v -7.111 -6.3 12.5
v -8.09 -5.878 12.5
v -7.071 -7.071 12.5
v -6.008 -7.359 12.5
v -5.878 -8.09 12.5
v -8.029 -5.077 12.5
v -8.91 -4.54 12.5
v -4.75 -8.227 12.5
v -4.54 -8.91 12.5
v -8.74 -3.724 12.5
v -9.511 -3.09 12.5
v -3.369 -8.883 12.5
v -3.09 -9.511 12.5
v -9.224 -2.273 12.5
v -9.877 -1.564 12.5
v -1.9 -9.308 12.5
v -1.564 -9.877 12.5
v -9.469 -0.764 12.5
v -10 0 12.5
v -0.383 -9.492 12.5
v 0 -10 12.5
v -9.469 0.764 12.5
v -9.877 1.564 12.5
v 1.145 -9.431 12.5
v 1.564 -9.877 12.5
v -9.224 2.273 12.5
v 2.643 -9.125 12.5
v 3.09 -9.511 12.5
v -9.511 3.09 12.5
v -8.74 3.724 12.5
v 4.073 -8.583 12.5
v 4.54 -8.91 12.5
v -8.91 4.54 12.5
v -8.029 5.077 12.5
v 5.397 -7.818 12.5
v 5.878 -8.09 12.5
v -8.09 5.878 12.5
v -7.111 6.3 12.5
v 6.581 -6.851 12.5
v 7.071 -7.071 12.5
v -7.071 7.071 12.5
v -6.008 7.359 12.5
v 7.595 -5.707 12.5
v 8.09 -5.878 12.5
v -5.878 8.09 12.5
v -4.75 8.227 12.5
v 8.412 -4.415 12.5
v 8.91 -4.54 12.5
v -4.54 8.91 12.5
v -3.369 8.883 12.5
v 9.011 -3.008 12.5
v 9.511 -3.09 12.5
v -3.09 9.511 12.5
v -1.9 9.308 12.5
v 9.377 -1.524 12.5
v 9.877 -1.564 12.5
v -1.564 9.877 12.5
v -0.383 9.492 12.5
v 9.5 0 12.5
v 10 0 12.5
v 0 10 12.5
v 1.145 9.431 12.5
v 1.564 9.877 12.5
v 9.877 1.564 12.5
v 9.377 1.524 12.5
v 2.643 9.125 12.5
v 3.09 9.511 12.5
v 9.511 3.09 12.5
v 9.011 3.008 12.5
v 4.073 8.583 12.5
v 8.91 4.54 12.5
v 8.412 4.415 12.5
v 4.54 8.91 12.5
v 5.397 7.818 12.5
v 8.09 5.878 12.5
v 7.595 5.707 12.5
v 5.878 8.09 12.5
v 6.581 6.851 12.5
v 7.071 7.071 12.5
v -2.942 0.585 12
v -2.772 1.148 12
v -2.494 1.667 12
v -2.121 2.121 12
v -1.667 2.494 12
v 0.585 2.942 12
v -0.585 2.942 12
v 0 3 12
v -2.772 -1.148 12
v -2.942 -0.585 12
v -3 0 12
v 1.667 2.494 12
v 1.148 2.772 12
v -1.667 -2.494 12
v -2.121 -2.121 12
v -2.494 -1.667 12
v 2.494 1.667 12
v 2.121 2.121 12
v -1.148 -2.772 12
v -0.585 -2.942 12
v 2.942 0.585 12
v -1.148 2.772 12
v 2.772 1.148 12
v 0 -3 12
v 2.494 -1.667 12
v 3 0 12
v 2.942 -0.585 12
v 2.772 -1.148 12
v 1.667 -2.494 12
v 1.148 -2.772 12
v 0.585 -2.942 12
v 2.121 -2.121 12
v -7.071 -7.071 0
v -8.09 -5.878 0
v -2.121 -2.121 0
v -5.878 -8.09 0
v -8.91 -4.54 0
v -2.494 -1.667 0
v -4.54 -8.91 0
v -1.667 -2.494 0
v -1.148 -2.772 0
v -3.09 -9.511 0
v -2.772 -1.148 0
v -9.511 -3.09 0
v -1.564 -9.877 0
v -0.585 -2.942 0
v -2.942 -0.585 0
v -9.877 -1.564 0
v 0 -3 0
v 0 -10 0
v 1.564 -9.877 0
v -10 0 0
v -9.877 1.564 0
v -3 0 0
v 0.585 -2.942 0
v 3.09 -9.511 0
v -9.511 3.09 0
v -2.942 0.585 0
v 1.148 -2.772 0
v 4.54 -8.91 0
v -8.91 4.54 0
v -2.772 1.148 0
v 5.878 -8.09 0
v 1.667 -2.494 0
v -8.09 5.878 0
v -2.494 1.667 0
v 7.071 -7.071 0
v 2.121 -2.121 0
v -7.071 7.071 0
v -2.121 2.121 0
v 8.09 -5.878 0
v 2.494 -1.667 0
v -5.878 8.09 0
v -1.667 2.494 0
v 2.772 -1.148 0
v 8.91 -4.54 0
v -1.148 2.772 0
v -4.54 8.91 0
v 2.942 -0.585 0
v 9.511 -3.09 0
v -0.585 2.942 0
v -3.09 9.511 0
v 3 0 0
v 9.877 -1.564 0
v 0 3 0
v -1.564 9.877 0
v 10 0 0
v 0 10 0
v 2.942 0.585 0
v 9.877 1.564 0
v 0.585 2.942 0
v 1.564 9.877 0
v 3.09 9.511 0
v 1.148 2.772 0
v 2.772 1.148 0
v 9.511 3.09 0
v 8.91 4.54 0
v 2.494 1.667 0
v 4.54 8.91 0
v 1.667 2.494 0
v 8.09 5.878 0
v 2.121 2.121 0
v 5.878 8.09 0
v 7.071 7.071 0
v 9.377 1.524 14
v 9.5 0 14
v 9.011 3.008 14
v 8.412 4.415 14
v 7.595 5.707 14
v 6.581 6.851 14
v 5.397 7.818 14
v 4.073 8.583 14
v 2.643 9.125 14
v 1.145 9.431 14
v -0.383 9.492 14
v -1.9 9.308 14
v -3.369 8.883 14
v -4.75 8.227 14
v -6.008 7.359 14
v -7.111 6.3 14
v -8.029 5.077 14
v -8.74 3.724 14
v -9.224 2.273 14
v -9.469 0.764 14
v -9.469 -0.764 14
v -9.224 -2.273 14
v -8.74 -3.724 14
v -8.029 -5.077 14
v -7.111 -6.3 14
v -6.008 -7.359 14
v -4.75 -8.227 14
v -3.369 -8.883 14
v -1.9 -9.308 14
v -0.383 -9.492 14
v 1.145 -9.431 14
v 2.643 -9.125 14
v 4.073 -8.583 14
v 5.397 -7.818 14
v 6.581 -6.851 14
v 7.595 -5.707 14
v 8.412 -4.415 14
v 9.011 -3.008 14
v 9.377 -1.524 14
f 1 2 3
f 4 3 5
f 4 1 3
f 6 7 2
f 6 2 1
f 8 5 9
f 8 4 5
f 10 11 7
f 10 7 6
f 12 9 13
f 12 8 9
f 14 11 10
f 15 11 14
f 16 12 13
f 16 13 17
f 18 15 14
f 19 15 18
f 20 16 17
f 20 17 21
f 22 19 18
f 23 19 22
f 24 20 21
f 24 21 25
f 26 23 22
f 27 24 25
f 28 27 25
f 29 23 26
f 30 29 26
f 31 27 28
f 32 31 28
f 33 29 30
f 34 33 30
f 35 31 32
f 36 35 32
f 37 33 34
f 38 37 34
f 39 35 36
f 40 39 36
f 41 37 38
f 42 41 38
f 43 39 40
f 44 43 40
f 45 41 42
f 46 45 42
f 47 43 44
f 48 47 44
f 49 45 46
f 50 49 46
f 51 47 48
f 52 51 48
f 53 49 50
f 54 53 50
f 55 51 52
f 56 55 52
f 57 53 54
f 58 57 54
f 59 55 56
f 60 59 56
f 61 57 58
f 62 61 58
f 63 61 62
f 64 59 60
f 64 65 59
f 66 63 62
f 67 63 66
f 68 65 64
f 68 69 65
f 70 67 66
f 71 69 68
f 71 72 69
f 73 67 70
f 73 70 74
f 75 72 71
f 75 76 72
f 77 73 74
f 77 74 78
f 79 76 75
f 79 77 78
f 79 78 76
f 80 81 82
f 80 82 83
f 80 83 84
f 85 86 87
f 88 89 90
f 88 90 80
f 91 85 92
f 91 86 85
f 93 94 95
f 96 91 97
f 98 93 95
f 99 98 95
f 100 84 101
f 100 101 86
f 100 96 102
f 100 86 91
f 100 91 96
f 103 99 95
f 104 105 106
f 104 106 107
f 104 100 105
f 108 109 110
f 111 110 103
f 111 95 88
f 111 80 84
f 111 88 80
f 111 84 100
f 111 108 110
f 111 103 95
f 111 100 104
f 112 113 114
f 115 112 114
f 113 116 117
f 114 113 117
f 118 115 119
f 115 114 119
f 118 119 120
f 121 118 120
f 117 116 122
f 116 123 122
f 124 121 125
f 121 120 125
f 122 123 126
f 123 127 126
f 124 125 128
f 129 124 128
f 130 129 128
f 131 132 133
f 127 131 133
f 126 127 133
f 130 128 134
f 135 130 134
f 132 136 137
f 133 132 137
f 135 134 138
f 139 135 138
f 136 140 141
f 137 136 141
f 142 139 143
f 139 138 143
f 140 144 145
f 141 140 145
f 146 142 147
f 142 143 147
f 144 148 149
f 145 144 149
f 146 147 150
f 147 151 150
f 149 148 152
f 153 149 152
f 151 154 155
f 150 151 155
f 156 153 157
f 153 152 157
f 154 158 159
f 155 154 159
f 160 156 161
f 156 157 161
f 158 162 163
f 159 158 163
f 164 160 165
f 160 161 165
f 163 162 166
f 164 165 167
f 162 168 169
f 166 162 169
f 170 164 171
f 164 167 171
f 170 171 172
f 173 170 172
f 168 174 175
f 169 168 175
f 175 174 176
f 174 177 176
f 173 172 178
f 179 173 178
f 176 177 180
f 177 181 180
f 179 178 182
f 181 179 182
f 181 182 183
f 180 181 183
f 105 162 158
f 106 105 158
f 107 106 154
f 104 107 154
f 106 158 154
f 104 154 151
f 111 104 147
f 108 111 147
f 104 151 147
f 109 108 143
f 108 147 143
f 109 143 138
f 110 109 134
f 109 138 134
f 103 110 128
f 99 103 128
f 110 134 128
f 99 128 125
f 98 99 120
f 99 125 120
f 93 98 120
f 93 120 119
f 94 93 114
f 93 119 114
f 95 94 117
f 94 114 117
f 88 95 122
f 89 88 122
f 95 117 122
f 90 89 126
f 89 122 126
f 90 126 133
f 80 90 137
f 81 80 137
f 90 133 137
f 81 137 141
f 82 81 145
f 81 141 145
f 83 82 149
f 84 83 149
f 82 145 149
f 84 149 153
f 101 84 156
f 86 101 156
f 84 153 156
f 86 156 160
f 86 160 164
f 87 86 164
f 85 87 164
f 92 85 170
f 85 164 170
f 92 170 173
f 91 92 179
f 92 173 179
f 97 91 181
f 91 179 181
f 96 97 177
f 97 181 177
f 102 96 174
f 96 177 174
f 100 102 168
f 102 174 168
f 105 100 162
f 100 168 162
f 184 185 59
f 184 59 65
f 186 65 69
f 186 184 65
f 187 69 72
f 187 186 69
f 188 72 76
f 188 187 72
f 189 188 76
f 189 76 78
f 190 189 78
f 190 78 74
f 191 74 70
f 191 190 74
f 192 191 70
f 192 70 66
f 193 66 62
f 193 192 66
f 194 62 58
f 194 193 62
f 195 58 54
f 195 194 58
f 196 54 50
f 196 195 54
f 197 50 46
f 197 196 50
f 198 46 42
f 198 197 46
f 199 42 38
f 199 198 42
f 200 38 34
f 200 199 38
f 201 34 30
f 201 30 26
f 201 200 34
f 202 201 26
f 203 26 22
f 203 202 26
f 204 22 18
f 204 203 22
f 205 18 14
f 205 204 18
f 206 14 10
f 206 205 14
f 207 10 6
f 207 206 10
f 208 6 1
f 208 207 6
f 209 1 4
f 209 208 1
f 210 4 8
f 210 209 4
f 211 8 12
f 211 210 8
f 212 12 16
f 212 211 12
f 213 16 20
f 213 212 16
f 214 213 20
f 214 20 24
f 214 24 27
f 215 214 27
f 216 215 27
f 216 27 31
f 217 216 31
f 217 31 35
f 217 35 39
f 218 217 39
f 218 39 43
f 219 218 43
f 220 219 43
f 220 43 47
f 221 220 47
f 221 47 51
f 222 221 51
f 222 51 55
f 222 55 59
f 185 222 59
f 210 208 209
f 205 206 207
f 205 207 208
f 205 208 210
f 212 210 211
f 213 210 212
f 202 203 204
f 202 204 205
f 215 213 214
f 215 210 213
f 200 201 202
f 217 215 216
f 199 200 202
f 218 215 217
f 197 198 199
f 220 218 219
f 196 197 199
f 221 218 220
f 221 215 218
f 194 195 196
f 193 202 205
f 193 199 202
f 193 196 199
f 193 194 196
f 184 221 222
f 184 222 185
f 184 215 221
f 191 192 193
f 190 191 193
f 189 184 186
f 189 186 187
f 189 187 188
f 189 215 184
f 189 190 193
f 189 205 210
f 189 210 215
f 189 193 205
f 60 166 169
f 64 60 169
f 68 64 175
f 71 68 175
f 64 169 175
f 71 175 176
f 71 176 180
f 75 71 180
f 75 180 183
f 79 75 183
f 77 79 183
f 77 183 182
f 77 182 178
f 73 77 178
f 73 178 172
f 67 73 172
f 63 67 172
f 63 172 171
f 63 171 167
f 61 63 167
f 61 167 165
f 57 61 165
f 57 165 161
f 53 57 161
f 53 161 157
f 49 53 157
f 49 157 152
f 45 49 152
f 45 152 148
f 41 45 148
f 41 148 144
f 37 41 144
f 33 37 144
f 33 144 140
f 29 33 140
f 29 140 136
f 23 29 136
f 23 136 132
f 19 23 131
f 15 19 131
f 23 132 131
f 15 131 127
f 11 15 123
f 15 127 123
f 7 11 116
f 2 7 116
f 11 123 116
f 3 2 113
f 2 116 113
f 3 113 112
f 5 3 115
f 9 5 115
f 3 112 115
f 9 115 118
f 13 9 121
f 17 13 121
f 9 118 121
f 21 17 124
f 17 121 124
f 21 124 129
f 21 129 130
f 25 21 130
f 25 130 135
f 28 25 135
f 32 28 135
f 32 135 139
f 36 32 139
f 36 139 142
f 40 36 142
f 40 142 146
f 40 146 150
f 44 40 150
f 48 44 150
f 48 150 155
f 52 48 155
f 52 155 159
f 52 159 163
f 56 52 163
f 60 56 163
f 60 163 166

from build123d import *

# Parameters (mm, degrees)
F0_R     = 10
F1_DEPTH = 14
F2_R     = 3
F3_DEPTH = 12
F4_R     = 10
F4_R_2   = 9.5
F5_DEPTH = 1.5


with BuildPart() as f1:
    # F0 (on Top) → F1 (new body)
    with BuildSketch(Plane.XY):
        Circle(F0_R)
    extrude(amount=F1_DEPTH)

    # F2 (on face) → F3 (cut)
    with BuildSketch(Plane(origin=(0, 0, 0), x_dir=(1, 0, 0), z_dir=(0, 0, -1))):
        Circle(F2_R)
    extrude(amount=-F3_DEPTH, mode=Mode.SUBTRACT)

    # F4 (on face) → F5 (cut)
    with BuildSketch(Plane.XY.offset(14)):
        Circle(F4_R)
        Circle(F4_R_2, mode=Mode.SUBTRACT)
    extrude(amount=-F5_DEPTH, mode=Mode.SUBTRACT)


solid = f1.part
